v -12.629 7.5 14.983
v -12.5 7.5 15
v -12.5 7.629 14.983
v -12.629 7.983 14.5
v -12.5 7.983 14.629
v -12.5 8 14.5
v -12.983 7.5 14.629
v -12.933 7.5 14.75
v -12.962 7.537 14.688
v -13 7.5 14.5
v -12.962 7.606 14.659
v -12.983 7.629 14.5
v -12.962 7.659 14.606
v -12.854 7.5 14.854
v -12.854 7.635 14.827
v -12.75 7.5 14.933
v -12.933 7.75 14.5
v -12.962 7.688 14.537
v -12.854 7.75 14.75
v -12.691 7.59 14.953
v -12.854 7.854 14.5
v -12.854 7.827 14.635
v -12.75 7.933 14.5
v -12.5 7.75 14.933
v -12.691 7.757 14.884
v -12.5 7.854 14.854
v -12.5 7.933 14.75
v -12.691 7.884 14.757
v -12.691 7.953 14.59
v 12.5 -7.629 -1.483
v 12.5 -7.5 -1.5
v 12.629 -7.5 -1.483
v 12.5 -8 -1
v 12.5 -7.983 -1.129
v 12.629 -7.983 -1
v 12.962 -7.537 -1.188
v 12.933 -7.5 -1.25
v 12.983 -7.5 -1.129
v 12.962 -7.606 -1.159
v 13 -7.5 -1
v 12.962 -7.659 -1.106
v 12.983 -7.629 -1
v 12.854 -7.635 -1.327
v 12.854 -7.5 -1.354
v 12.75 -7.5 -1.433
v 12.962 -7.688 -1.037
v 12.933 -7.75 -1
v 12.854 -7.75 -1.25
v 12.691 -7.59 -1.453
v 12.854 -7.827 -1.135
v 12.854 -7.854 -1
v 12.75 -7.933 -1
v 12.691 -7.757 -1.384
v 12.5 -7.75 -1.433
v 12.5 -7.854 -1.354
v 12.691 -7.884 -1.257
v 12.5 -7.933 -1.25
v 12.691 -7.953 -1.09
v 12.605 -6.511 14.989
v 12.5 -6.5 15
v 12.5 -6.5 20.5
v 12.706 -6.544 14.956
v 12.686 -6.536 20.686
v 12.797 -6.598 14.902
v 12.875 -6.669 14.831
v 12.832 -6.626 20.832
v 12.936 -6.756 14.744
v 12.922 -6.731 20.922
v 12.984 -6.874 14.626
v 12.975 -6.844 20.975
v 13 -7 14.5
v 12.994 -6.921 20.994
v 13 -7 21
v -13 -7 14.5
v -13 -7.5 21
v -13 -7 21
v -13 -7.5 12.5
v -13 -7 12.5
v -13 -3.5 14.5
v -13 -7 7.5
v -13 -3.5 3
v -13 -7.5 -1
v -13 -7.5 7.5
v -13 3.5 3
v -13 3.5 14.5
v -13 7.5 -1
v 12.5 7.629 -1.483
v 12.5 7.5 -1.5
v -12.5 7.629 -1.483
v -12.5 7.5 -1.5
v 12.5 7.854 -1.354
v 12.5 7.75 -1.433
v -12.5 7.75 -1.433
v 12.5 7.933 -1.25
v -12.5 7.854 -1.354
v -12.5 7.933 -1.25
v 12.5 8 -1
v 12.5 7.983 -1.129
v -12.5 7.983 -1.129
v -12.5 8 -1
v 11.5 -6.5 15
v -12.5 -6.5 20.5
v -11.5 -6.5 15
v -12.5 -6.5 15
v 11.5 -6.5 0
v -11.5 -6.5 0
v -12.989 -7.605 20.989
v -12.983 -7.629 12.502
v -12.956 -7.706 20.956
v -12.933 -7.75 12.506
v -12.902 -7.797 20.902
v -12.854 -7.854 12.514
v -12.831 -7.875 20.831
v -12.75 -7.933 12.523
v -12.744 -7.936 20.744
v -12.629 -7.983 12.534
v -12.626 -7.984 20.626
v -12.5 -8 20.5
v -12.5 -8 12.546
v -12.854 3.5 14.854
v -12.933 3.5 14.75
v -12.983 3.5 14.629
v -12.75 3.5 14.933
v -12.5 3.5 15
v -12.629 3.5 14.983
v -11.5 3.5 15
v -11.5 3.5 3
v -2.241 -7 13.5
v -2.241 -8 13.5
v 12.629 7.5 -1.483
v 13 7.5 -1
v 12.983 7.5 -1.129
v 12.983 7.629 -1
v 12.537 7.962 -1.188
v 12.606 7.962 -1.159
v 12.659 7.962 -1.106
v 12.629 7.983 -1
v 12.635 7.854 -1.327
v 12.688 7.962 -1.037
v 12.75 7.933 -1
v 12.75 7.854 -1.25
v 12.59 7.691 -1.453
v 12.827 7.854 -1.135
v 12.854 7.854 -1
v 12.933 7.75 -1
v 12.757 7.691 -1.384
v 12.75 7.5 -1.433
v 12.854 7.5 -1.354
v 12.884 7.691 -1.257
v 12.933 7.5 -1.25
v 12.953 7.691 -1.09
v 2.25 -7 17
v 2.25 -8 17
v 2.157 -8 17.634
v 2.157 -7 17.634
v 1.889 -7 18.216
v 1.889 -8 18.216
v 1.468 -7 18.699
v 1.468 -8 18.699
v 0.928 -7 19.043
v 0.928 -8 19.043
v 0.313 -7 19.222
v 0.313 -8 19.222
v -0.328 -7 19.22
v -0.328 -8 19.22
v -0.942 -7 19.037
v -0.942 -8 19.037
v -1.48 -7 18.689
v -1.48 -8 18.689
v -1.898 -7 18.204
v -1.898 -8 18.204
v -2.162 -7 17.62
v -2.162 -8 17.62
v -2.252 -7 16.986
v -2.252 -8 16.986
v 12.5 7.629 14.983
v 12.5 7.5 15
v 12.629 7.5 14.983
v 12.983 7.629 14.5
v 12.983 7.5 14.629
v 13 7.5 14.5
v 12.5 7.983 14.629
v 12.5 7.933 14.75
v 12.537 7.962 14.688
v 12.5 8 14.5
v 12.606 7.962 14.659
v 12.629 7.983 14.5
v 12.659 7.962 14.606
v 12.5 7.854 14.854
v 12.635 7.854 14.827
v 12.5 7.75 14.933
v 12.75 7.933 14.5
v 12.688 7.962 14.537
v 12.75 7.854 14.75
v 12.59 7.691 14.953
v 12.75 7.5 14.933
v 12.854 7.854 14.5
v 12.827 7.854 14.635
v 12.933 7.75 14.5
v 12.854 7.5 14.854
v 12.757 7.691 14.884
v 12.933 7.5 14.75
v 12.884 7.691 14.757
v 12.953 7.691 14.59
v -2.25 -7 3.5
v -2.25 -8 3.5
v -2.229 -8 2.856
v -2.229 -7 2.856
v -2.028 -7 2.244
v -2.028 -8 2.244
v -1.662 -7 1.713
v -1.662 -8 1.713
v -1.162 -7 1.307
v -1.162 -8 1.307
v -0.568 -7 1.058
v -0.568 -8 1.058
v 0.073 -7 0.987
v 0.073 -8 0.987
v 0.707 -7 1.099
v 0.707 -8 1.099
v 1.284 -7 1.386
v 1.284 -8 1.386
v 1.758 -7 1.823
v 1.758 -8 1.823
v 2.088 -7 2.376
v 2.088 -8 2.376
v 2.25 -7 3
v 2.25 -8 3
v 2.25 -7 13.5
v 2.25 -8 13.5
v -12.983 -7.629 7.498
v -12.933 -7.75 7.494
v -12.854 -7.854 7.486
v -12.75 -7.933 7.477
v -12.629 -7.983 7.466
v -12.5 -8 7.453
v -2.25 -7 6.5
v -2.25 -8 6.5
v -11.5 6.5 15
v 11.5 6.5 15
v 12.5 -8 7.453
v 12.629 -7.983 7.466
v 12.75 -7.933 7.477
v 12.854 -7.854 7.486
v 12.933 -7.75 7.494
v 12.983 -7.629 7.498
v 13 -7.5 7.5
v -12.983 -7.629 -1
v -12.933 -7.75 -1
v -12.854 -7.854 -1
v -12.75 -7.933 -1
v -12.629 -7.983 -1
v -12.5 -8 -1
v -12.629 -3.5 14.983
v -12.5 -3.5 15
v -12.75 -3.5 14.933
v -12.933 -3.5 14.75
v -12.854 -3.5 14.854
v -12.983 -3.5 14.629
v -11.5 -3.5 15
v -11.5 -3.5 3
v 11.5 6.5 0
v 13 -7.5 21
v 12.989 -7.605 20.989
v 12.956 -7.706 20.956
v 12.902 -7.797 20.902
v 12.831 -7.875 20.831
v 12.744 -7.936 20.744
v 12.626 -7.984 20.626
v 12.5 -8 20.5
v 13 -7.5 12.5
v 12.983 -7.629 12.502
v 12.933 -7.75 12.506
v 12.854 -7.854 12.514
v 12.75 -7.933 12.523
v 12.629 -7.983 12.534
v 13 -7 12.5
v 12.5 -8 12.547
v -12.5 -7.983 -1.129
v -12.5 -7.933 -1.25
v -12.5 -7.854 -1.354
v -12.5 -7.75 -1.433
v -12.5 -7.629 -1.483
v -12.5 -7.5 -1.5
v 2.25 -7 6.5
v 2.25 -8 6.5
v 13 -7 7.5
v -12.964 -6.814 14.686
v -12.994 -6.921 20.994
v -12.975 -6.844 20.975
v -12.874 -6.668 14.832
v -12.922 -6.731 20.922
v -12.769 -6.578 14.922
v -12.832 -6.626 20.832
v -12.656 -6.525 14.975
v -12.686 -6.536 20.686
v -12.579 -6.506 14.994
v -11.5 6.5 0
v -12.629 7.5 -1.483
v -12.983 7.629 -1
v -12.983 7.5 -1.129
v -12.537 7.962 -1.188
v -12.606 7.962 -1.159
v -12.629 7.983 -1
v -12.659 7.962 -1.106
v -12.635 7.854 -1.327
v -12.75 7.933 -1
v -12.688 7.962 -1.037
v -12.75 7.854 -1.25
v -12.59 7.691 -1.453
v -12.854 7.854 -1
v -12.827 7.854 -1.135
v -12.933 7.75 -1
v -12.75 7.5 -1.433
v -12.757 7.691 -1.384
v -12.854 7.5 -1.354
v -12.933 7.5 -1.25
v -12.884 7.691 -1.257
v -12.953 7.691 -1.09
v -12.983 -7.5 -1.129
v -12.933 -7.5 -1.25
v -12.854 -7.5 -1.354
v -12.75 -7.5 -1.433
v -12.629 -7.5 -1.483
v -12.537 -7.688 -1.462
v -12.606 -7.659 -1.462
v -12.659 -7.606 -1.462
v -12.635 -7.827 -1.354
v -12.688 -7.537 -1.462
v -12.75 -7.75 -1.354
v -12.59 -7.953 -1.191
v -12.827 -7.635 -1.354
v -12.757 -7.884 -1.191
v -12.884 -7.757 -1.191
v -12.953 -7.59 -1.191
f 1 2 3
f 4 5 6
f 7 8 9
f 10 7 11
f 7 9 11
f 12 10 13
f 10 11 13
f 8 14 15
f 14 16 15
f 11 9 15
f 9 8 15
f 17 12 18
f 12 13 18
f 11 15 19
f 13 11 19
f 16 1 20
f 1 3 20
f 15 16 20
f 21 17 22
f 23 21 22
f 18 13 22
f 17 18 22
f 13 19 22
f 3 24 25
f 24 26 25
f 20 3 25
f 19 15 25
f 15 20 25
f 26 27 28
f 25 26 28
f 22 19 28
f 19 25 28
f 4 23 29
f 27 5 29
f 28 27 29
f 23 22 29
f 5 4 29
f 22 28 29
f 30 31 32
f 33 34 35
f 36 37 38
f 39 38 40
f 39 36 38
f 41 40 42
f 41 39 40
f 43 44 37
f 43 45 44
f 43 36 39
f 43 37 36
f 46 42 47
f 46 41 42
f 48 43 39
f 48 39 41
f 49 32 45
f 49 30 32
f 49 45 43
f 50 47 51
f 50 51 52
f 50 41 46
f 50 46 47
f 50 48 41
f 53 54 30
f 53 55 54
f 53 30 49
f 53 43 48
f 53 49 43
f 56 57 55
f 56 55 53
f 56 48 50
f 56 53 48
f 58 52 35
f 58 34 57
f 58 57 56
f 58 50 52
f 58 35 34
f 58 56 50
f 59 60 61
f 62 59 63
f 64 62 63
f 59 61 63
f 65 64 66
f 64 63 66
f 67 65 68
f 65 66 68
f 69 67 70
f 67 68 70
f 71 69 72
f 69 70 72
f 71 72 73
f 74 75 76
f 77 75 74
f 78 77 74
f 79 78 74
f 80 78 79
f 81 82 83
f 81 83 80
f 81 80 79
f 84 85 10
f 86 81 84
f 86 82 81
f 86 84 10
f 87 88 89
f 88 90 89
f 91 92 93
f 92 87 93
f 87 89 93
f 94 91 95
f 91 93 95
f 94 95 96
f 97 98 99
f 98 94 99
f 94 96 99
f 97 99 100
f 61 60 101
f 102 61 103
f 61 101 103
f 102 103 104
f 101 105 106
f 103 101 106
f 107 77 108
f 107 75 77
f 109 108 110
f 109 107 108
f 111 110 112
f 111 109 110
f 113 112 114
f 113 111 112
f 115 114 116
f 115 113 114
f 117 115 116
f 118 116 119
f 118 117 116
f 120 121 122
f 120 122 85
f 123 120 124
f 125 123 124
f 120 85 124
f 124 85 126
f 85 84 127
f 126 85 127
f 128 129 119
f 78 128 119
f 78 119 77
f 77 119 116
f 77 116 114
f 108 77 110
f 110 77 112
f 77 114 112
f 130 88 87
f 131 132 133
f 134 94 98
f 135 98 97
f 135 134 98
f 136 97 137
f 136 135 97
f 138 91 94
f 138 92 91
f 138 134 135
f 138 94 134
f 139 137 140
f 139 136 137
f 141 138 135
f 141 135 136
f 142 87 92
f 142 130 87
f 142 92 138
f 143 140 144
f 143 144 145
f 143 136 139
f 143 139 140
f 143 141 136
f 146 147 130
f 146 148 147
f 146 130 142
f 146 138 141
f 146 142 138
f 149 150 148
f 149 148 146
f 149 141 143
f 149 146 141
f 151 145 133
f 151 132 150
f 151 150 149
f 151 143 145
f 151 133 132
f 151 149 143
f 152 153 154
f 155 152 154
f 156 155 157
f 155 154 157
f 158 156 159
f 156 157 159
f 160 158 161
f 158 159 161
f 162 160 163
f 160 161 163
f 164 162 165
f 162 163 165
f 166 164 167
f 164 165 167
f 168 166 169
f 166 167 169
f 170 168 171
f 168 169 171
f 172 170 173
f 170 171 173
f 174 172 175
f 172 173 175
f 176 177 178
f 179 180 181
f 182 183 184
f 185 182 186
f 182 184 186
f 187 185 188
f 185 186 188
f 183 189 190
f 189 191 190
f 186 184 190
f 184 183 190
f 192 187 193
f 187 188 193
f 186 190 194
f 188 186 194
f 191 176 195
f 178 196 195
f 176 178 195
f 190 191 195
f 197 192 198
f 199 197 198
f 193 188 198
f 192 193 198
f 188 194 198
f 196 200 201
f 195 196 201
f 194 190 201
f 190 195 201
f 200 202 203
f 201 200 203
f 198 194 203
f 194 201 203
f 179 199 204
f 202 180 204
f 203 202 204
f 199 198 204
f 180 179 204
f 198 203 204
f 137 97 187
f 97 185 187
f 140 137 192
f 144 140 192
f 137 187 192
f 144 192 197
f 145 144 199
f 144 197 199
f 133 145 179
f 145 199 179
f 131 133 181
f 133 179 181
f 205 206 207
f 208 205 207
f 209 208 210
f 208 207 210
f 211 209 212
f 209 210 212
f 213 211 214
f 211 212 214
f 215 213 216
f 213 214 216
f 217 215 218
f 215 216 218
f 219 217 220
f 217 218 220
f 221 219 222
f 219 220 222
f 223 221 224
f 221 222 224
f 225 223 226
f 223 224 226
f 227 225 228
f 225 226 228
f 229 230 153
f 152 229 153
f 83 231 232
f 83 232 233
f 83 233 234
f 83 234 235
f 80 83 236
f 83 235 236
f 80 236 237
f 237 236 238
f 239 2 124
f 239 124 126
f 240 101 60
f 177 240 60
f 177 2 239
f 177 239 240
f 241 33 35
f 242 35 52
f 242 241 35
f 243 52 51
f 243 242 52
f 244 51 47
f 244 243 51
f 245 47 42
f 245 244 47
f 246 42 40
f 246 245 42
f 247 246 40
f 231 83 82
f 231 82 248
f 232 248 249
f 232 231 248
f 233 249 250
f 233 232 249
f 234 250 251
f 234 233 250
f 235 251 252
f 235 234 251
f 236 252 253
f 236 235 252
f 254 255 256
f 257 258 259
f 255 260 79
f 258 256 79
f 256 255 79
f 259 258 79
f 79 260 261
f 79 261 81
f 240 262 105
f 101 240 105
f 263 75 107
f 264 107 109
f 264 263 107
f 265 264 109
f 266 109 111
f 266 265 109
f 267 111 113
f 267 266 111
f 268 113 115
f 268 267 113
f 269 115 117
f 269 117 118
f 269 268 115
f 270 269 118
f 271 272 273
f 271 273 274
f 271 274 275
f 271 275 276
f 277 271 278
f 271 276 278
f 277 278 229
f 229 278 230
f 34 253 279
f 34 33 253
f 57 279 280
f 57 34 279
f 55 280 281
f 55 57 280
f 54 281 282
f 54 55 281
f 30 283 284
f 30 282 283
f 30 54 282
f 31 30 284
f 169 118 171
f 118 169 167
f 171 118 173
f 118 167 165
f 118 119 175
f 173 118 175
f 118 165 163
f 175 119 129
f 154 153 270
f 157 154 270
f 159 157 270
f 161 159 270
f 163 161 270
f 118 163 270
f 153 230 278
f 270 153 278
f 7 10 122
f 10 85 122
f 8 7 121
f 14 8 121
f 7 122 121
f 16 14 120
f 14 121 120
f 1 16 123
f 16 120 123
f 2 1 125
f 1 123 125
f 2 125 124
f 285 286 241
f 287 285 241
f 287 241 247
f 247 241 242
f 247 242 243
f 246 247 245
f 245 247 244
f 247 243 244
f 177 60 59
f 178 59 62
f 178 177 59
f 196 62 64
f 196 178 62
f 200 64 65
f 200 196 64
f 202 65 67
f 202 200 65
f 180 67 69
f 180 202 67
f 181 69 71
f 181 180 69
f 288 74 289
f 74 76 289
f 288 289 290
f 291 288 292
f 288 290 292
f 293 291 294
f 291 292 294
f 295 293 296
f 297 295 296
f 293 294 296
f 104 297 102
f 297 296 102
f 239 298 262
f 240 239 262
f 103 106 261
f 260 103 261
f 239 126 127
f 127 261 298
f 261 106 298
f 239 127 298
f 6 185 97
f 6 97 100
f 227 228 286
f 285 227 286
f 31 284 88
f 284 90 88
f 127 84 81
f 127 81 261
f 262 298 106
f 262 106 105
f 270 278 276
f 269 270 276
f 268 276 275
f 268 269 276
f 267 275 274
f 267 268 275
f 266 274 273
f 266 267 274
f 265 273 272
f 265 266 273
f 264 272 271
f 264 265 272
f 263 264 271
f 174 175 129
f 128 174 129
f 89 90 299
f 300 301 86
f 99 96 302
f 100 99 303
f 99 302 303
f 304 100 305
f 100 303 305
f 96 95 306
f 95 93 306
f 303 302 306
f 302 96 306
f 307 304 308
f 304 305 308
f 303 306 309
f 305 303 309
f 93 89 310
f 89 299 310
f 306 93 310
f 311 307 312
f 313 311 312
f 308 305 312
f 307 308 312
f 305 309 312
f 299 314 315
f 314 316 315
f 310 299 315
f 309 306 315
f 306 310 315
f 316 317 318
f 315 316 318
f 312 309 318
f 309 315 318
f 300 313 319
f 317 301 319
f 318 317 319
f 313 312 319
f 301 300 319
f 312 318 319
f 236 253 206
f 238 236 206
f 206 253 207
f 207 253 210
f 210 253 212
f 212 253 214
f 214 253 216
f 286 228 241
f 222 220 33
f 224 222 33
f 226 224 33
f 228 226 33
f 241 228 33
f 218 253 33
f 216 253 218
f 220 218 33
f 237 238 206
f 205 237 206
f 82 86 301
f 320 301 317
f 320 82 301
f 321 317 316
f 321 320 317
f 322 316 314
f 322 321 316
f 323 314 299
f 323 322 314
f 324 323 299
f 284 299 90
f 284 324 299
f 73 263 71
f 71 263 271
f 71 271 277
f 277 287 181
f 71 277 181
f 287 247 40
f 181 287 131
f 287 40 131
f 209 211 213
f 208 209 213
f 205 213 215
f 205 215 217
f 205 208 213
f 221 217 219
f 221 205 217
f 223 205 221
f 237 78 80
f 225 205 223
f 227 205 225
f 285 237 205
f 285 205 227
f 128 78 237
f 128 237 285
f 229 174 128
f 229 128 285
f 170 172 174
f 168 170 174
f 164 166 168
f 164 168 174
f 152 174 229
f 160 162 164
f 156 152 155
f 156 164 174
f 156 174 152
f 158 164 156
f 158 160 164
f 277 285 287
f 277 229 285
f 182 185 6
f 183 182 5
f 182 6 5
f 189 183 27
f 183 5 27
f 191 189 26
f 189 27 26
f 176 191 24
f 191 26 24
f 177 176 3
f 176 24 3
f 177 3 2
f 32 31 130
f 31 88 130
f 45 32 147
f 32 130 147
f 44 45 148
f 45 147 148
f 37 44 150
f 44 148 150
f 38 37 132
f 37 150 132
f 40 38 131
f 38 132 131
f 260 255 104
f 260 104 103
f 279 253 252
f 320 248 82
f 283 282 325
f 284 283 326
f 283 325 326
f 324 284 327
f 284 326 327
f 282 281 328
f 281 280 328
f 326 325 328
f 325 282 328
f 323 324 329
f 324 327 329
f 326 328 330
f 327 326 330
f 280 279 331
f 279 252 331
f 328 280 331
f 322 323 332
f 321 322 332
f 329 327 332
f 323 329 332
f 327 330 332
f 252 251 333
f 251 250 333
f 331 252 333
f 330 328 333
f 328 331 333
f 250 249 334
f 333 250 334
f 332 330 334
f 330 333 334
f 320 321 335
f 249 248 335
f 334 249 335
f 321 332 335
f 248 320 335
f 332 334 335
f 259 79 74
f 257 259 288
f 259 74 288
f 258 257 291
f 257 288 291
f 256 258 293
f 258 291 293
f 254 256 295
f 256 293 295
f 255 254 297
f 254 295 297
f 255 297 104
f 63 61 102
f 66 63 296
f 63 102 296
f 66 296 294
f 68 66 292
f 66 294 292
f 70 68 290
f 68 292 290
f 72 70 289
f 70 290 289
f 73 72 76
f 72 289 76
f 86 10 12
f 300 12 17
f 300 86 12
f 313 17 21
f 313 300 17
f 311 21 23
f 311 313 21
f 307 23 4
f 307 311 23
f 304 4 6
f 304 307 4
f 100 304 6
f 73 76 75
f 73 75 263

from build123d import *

# Parameters (mm, degrees)
F1_DEPTH = 15
F0_W     = 1.5
F0_H     = 7
F2_DEPTH = 1.5
F4_DEPTH = 6
F5_DEPTH = 3
F7_DEPTH = 1
F8_R     = 0.5


with BuildPart() as f1:
    # F0 (on Top) → F1 (new body)
    with BuildSketch(Plane.XY):
        Polygon((13, -8), (13, 8), (-13, 8), (-13, 3.5), (-11.5, 3.5), (-11.5, 6.5), (11.5, 6.5), (11.5, -6.5), (-11.5, -6.5), (-11.5, -3.5), (-13, -3.5), (-13, -8), align=None)
    extrude(amount=F1_DEPTH)

    # F0 (on Top) → F2 (join)
    with BuildSketch(Plane.XY):
        Polygon((-11.5, 6.5), (-11.5, 3.5), (-11.5, -3.5), (-11.5, -6.5), (11.5, -6.5), (11.5, 6.5), align=None)
        Polygon((13, -8), (13, 8), (-13, 8), (-13, 3.5), (-11.5, 3.5), (-11.5, 6.5), (11.5, 6.5), (11.5, -6.5), (-11.5, -6.5), (-11.5, -3.5), (-13, -3.5), (-13, -8), align=None)
        with Locations((-12.25, 0)):
            Rectangle(F0_W, F0_H)
    extrude(amount=-F2_DEPTH)

    # F3 (on face) → F4 (join)
    with BuildSketch(Plane.XY.offset(15)):
        Polygon((11.5, -6.5), (-11.5, -6.5), (-13, -6.5), (-13, -8), (13, -8), (13, -6.5), align=None)
    extrude(amount=F4_DEPTH)

    # F0 (on Top) → F5 (join)
    with BuildSketch(Plane.XY):
        with Locations((-12.25, 0)):
            Rectangle(F0_W, F0_H)
    extrude(amount=F5_DEPTH)

    # F6 (on face) → F7 (cut)
    with BuildSketch(Plane.XZ.offset(8)):
        with BuildLine():
            Line((-2.2407097466, 13.5), (2.25, 13.5))
            Line((2.25, 13.5), (2.25, 17))
            ThreePointArc((2.25, 17), (-0.0077226241, 19.2437825827), (-2.2515052067, 16.9860599586))
            Line((-2.2515052067, 16.9860599586), (-2.2407097466, 13.5))
        make_face()
        Polygon((13, 12.5), (2.25, 13.5), (-2.2407097466, 13.5), (-13, 12.5), (-13, 7.5), (-2.25, 6.5), (2.25, 6.5), (13, 7.5), align=None)
        with BuildLine():
            Line((2.25, 3), (2.25, 6.5))
            Line((2.25, 6.5), (-2.25, 6.5))
            Line((-2.25, 6.5), (-2.25, 3.5))
            ThreePointArc((-2.25, 3.5), (-0.25, 1), (2.25, 3))
        make_face()
    extrude(amount=-F7_DEPTH, mode=Mode.SUBTRACT)

    # F8
    f8_edges = [f1.edges().sort_by_distance(p)[0] for p in [
        (13, 0.75, 15),
        (0, 8, 15),
        (-13, 5.75, 15),
        (-13, -5, 15),
        (13, -6.5, 18),
        (0, -6.5, 21),
        (-13, -8, 3),
        (0, -8, -1.5),
        (-13, 0, -1.5),
        (13, 0, -1.5),
        (0, 8, -1.5),
        (13, 8, 6.75),
        (-13, 8, 6.75),
        (0, -8, 21),
        (-13, -8, 16.75),
        (-13, -6.5, 18),
        (13, -8, 16.75),
        (13, -8, 3),
    ]]
    fillet(f8_edges, radius=F8_R)


solid = f1.part
